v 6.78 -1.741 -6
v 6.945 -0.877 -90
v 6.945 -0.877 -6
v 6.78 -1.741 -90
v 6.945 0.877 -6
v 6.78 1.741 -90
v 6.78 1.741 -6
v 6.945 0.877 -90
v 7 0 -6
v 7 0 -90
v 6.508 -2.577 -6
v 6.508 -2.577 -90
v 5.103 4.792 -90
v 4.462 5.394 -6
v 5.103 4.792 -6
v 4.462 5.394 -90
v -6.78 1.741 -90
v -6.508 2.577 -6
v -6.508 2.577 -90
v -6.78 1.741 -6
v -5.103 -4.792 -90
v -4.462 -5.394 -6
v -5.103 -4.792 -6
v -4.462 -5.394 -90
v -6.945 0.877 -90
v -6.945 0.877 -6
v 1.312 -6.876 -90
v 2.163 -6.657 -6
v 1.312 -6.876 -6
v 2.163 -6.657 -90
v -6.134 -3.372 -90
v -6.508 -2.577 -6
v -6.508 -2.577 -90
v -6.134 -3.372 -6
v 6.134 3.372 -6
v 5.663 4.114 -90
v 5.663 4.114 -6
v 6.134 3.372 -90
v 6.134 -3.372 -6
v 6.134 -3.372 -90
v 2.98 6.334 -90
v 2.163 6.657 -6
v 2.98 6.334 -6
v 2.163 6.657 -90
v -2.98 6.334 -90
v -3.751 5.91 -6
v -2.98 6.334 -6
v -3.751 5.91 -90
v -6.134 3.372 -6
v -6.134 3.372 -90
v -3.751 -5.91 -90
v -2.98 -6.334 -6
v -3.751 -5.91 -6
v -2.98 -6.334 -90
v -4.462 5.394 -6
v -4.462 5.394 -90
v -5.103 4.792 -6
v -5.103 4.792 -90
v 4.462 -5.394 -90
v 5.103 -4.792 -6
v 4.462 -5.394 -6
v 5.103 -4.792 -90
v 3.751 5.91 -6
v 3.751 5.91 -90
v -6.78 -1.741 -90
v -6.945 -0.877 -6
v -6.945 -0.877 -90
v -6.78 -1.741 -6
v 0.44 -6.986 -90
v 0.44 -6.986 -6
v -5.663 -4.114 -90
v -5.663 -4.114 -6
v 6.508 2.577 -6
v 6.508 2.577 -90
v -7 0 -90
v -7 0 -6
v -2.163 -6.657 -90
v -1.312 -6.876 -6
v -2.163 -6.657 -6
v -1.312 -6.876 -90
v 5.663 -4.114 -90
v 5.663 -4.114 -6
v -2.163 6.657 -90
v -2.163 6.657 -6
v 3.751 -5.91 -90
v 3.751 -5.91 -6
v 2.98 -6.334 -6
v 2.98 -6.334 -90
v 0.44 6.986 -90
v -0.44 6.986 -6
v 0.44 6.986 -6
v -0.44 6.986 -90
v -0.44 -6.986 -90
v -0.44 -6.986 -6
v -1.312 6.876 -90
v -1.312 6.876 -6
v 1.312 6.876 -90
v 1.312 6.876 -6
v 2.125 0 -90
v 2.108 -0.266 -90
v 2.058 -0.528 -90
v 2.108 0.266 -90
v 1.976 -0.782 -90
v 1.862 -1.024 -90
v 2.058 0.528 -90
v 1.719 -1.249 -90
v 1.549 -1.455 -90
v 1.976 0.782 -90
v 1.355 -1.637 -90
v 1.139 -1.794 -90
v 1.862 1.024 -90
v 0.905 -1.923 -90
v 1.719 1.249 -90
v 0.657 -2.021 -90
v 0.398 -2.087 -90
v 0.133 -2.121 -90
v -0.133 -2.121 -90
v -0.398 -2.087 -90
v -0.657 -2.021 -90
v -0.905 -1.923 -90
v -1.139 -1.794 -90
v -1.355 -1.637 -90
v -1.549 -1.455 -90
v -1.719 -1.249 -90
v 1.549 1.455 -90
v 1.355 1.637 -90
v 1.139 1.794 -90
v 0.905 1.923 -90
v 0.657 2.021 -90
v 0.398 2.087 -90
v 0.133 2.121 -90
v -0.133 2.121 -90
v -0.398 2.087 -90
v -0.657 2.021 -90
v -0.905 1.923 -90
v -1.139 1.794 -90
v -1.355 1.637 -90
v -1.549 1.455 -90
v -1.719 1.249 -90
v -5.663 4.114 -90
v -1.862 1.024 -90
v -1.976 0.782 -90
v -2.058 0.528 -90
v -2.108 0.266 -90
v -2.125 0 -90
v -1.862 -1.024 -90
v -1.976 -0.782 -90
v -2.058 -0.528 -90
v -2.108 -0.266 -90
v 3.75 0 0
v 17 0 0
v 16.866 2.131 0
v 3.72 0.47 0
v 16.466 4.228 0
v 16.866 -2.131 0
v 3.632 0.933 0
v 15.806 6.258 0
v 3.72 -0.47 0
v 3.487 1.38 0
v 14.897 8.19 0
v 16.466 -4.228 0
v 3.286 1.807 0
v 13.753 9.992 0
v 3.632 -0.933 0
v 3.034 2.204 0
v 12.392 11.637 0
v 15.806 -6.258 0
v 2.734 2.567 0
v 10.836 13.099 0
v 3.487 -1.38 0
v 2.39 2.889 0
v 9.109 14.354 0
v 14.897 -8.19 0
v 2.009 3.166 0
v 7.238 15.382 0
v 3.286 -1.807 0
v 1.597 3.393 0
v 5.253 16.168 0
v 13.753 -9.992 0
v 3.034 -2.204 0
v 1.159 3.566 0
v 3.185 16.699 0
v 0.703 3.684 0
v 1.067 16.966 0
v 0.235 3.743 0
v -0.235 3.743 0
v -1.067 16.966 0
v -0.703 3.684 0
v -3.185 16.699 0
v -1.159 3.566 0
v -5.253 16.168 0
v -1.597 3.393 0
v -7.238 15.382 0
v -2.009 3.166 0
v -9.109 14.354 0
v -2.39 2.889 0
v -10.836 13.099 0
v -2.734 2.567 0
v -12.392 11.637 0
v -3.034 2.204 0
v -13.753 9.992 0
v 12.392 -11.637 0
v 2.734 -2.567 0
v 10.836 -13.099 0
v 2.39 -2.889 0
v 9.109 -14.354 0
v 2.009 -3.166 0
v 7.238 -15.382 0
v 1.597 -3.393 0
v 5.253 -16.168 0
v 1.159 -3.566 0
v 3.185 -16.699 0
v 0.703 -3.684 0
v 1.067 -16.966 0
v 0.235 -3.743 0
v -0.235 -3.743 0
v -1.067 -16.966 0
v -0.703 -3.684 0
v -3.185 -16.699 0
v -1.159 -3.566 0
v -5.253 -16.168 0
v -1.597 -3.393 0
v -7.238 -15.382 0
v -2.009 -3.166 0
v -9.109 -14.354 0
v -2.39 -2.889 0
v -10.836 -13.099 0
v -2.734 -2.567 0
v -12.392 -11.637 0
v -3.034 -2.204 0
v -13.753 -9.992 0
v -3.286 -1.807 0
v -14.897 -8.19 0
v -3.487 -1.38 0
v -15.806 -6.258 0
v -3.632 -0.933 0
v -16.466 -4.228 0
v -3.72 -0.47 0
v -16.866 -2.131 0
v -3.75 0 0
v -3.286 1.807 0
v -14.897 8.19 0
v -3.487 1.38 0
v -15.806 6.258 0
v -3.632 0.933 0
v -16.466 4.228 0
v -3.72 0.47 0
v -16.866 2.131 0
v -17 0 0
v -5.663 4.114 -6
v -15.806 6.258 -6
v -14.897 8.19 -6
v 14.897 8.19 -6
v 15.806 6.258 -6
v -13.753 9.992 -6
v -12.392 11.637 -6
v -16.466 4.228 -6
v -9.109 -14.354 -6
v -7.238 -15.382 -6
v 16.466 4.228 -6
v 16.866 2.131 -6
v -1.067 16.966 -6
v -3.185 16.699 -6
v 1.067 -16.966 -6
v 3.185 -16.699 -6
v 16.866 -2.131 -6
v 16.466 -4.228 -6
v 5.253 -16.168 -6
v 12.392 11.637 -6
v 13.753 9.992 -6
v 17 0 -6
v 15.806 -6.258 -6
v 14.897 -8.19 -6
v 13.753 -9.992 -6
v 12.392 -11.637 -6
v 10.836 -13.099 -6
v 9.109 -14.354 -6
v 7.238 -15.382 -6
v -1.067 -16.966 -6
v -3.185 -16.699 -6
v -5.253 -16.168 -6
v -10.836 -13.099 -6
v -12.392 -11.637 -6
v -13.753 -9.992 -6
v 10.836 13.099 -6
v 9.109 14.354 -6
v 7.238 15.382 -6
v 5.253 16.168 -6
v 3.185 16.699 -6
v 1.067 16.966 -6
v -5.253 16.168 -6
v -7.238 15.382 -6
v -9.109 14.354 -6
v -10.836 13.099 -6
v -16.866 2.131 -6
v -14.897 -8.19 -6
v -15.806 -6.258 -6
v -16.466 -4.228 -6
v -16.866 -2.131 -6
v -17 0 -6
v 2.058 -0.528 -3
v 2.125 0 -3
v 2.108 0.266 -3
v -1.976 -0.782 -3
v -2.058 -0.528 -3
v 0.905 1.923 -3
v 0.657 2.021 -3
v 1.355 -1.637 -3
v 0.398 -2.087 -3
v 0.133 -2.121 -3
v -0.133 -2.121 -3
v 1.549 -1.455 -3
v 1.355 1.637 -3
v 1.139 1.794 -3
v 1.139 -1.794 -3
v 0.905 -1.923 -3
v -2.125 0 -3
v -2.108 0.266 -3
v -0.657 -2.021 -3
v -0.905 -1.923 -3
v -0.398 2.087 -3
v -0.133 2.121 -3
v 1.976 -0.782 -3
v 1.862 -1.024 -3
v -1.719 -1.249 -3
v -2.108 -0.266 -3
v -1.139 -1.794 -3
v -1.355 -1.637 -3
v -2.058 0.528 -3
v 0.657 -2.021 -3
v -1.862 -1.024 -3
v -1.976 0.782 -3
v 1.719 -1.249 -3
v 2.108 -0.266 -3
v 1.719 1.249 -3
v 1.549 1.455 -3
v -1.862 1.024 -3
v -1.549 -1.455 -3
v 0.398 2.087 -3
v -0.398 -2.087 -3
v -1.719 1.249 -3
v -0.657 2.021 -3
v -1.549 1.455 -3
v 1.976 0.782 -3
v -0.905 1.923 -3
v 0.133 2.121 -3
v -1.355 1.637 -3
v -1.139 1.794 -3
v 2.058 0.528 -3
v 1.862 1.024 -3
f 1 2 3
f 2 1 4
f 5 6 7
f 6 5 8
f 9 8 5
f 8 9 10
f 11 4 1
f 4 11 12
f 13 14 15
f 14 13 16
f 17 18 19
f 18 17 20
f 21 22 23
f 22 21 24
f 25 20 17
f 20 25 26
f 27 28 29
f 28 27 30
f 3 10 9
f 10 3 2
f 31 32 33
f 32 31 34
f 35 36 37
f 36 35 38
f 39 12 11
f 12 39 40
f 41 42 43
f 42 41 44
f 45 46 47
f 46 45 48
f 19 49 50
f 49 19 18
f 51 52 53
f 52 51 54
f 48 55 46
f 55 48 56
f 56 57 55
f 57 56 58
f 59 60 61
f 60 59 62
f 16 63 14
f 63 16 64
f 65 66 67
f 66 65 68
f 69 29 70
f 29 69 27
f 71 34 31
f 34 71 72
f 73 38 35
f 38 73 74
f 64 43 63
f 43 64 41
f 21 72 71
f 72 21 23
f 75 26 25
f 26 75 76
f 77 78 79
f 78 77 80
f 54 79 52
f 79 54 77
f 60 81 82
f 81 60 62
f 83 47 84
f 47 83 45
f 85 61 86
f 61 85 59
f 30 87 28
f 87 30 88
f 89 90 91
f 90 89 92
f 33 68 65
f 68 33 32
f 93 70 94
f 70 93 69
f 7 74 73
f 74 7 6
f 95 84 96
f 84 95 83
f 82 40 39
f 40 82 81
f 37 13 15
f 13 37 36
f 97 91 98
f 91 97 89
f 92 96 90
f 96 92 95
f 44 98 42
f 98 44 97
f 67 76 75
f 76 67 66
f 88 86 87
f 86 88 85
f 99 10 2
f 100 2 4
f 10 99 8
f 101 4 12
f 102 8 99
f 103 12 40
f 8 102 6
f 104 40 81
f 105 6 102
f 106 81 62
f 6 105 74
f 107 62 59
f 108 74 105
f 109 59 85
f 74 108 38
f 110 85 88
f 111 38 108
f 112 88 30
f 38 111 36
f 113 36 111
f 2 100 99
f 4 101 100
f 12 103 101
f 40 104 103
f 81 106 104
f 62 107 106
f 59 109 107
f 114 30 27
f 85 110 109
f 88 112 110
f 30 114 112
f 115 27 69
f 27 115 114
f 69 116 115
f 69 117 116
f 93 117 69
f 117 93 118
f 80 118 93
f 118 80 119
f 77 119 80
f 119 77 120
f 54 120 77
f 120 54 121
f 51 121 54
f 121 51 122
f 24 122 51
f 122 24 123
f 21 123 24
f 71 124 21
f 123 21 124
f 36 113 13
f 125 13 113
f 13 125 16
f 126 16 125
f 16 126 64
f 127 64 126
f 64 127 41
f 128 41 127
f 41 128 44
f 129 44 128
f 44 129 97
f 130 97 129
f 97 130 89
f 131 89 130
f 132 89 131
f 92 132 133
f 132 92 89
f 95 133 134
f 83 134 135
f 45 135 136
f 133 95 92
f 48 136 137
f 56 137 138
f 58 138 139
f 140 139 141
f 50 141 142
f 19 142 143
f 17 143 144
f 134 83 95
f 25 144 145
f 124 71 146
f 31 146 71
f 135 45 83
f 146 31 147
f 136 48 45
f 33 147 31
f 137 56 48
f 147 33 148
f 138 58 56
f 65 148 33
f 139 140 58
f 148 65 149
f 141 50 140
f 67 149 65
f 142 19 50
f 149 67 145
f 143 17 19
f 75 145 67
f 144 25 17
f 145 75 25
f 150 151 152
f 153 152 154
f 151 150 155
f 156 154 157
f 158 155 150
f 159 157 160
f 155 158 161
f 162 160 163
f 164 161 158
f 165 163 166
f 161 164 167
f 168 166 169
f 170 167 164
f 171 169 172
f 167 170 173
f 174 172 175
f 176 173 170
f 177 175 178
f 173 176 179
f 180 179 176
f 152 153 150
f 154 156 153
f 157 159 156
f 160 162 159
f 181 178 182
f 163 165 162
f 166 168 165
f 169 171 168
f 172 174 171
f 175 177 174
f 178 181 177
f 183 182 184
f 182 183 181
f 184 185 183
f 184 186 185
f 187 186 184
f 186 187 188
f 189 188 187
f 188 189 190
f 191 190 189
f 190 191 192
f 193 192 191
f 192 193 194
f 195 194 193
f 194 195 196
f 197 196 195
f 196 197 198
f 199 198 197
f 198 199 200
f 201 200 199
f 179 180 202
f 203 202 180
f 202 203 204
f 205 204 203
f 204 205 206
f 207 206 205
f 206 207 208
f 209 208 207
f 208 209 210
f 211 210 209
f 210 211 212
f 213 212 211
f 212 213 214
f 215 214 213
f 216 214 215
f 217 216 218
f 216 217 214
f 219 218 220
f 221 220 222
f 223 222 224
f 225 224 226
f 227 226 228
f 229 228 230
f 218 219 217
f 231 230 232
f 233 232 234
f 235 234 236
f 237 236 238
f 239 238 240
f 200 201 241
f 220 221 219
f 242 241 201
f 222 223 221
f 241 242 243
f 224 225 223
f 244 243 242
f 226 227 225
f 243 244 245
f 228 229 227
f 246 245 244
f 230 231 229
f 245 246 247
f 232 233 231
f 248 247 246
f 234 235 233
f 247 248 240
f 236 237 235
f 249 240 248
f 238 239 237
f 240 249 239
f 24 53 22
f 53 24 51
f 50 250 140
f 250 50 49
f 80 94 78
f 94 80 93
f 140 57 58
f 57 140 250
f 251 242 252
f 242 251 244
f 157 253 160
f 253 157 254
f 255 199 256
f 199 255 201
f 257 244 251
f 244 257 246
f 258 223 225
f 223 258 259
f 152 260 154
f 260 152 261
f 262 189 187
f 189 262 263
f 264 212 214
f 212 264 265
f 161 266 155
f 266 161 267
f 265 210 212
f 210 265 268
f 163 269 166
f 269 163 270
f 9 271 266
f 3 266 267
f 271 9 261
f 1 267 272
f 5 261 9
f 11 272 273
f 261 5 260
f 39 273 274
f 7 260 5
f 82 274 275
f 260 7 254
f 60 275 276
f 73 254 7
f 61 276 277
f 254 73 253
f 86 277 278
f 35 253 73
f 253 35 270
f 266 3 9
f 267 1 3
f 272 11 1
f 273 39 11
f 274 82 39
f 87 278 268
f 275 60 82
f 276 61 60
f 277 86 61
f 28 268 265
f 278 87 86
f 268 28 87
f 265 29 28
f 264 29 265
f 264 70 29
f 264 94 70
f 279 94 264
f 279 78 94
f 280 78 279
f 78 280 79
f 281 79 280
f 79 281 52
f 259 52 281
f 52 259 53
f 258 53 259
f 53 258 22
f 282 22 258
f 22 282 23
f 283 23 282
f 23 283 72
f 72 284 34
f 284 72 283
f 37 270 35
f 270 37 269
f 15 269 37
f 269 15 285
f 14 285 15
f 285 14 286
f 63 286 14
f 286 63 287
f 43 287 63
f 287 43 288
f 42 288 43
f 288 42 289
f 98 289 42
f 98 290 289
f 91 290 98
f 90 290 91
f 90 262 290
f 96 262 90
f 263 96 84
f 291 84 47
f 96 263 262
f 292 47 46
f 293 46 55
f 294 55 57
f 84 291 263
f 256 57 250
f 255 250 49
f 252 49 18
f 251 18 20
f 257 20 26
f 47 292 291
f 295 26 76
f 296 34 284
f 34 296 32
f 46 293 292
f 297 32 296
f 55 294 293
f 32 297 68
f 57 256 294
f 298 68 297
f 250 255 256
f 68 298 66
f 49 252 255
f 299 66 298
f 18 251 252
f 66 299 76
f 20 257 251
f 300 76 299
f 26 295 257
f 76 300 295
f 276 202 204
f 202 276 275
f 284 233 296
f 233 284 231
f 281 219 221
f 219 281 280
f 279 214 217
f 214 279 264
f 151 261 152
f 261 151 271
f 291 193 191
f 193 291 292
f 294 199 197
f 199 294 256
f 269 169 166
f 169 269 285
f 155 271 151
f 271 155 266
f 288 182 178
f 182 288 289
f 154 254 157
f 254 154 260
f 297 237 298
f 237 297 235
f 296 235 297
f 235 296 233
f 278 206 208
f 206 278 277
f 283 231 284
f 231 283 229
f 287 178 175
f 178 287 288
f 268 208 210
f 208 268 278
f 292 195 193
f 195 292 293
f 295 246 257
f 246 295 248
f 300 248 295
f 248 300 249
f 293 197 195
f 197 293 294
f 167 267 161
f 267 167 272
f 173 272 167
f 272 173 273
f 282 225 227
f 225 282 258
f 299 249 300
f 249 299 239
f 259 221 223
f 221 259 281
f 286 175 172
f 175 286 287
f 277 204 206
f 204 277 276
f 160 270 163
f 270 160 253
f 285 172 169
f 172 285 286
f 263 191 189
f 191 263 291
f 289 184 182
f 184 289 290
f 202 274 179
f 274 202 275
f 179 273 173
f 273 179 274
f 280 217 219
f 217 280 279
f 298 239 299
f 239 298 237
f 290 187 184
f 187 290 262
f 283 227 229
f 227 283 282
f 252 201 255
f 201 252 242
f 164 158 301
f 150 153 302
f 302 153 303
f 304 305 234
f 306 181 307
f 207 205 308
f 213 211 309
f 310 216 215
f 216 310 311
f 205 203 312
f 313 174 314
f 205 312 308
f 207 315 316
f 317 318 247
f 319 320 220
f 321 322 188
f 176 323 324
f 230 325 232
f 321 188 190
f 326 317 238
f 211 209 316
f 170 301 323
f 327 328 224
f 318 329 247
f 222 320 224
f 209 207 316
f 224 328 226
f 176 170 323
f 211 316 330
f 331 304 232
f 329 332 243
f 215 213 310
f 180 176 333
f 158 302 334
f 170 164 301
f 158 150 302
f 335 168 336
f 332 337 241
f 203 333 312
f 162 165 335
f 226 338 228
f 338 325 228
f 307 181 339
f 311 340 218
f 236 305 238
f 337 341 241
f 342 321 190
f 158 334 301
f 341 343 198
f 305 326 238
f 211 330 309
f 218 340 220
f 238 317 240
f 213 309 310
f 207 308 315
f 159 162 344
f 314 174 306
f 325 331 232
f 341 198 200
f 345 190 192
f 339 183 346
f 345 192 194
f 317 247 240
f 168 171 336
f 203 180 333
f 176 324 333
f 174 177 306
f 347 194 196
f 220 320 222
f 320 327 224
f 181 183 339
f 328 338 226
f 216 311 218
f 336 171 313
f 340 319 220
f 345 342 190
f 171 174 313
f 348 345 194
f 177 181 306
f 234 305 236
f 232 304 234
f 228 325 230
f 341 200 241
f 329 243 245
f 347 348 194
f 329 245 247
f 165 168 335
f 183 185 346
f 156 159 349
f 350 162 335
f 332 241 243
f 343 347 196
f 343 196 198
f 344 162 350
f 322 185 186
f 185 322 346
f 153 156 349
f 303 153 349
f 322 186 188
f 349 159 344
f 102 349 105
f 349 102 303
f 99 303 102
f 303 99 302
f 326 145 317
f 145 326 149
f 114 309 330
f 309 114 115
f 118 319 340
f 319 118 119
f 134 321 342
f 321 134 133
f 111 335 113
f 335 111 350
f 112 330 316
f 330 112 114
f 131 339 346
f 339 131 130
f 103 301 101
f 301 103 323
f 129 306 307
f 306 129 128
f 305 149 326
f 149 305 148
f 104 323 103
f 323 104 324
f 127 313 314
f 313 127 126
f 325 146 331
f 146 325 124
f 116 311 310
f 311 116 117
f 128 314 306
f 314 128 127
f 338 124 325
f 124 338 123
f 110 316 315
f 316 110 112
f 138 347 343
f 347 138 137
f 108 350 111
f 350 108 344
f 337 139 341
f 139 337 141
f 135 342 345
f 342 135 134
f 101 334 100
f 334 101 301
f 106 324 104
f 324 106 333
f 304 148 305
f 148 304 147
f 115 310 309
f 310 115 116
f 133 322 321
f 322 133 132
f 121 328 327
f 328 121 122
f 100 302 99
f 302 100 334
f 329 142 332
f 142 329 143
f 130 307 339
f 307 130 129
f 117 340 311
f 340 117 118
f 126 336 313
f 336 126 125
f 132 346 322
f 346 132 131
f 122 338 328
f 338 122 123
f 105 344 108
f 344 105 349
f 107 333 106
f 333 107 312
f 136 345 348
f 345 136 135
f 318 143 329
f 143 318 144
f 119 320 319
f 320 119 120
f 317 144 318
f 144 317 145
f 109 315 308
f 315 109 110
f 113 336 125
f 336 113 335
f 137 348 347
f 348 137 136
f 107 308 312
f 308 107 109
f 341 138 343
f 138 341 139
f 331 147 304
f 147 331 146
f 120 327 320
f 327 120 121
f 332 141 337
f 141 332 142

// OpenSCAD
$fn = 50;


difference() {
	union() {
		translate(v = [0, 0, -90.0000000000]) {
			cylinder(h = 90, r = 7.0000000000);
		}
		translate(v = [0, 0, -6.0000000000]) {
			cylinder(h = 6, r = 17.0000000000);
		}
	}
	union() {
		translate(v = [0, 0, 0]) {
			rotate(a = [0, 0, 0]) {
				difference() {
					union() {
						#translate(v = [0, 0, -90.0000000000]) {
							cylinder(h = 90, r = 2.0000000000);
						}
						#translate(v = [0, 0, -3]) {
							cylinder(h = 3, r = 7.0000000000, r1 = 2.1250000000, r2 = 3.7500000000);
						}
						#translate(v = [0, 0, -90.0000000000]) {
							cylinder(h = 90, r = 2.1250000000);
						}
						#translate(v = [0, 0, -90.0000000000]) {
							cylinder(h = 90, r = 2.0000000000);
						}
					}
					union();
				}
			}
		}
	}
}
